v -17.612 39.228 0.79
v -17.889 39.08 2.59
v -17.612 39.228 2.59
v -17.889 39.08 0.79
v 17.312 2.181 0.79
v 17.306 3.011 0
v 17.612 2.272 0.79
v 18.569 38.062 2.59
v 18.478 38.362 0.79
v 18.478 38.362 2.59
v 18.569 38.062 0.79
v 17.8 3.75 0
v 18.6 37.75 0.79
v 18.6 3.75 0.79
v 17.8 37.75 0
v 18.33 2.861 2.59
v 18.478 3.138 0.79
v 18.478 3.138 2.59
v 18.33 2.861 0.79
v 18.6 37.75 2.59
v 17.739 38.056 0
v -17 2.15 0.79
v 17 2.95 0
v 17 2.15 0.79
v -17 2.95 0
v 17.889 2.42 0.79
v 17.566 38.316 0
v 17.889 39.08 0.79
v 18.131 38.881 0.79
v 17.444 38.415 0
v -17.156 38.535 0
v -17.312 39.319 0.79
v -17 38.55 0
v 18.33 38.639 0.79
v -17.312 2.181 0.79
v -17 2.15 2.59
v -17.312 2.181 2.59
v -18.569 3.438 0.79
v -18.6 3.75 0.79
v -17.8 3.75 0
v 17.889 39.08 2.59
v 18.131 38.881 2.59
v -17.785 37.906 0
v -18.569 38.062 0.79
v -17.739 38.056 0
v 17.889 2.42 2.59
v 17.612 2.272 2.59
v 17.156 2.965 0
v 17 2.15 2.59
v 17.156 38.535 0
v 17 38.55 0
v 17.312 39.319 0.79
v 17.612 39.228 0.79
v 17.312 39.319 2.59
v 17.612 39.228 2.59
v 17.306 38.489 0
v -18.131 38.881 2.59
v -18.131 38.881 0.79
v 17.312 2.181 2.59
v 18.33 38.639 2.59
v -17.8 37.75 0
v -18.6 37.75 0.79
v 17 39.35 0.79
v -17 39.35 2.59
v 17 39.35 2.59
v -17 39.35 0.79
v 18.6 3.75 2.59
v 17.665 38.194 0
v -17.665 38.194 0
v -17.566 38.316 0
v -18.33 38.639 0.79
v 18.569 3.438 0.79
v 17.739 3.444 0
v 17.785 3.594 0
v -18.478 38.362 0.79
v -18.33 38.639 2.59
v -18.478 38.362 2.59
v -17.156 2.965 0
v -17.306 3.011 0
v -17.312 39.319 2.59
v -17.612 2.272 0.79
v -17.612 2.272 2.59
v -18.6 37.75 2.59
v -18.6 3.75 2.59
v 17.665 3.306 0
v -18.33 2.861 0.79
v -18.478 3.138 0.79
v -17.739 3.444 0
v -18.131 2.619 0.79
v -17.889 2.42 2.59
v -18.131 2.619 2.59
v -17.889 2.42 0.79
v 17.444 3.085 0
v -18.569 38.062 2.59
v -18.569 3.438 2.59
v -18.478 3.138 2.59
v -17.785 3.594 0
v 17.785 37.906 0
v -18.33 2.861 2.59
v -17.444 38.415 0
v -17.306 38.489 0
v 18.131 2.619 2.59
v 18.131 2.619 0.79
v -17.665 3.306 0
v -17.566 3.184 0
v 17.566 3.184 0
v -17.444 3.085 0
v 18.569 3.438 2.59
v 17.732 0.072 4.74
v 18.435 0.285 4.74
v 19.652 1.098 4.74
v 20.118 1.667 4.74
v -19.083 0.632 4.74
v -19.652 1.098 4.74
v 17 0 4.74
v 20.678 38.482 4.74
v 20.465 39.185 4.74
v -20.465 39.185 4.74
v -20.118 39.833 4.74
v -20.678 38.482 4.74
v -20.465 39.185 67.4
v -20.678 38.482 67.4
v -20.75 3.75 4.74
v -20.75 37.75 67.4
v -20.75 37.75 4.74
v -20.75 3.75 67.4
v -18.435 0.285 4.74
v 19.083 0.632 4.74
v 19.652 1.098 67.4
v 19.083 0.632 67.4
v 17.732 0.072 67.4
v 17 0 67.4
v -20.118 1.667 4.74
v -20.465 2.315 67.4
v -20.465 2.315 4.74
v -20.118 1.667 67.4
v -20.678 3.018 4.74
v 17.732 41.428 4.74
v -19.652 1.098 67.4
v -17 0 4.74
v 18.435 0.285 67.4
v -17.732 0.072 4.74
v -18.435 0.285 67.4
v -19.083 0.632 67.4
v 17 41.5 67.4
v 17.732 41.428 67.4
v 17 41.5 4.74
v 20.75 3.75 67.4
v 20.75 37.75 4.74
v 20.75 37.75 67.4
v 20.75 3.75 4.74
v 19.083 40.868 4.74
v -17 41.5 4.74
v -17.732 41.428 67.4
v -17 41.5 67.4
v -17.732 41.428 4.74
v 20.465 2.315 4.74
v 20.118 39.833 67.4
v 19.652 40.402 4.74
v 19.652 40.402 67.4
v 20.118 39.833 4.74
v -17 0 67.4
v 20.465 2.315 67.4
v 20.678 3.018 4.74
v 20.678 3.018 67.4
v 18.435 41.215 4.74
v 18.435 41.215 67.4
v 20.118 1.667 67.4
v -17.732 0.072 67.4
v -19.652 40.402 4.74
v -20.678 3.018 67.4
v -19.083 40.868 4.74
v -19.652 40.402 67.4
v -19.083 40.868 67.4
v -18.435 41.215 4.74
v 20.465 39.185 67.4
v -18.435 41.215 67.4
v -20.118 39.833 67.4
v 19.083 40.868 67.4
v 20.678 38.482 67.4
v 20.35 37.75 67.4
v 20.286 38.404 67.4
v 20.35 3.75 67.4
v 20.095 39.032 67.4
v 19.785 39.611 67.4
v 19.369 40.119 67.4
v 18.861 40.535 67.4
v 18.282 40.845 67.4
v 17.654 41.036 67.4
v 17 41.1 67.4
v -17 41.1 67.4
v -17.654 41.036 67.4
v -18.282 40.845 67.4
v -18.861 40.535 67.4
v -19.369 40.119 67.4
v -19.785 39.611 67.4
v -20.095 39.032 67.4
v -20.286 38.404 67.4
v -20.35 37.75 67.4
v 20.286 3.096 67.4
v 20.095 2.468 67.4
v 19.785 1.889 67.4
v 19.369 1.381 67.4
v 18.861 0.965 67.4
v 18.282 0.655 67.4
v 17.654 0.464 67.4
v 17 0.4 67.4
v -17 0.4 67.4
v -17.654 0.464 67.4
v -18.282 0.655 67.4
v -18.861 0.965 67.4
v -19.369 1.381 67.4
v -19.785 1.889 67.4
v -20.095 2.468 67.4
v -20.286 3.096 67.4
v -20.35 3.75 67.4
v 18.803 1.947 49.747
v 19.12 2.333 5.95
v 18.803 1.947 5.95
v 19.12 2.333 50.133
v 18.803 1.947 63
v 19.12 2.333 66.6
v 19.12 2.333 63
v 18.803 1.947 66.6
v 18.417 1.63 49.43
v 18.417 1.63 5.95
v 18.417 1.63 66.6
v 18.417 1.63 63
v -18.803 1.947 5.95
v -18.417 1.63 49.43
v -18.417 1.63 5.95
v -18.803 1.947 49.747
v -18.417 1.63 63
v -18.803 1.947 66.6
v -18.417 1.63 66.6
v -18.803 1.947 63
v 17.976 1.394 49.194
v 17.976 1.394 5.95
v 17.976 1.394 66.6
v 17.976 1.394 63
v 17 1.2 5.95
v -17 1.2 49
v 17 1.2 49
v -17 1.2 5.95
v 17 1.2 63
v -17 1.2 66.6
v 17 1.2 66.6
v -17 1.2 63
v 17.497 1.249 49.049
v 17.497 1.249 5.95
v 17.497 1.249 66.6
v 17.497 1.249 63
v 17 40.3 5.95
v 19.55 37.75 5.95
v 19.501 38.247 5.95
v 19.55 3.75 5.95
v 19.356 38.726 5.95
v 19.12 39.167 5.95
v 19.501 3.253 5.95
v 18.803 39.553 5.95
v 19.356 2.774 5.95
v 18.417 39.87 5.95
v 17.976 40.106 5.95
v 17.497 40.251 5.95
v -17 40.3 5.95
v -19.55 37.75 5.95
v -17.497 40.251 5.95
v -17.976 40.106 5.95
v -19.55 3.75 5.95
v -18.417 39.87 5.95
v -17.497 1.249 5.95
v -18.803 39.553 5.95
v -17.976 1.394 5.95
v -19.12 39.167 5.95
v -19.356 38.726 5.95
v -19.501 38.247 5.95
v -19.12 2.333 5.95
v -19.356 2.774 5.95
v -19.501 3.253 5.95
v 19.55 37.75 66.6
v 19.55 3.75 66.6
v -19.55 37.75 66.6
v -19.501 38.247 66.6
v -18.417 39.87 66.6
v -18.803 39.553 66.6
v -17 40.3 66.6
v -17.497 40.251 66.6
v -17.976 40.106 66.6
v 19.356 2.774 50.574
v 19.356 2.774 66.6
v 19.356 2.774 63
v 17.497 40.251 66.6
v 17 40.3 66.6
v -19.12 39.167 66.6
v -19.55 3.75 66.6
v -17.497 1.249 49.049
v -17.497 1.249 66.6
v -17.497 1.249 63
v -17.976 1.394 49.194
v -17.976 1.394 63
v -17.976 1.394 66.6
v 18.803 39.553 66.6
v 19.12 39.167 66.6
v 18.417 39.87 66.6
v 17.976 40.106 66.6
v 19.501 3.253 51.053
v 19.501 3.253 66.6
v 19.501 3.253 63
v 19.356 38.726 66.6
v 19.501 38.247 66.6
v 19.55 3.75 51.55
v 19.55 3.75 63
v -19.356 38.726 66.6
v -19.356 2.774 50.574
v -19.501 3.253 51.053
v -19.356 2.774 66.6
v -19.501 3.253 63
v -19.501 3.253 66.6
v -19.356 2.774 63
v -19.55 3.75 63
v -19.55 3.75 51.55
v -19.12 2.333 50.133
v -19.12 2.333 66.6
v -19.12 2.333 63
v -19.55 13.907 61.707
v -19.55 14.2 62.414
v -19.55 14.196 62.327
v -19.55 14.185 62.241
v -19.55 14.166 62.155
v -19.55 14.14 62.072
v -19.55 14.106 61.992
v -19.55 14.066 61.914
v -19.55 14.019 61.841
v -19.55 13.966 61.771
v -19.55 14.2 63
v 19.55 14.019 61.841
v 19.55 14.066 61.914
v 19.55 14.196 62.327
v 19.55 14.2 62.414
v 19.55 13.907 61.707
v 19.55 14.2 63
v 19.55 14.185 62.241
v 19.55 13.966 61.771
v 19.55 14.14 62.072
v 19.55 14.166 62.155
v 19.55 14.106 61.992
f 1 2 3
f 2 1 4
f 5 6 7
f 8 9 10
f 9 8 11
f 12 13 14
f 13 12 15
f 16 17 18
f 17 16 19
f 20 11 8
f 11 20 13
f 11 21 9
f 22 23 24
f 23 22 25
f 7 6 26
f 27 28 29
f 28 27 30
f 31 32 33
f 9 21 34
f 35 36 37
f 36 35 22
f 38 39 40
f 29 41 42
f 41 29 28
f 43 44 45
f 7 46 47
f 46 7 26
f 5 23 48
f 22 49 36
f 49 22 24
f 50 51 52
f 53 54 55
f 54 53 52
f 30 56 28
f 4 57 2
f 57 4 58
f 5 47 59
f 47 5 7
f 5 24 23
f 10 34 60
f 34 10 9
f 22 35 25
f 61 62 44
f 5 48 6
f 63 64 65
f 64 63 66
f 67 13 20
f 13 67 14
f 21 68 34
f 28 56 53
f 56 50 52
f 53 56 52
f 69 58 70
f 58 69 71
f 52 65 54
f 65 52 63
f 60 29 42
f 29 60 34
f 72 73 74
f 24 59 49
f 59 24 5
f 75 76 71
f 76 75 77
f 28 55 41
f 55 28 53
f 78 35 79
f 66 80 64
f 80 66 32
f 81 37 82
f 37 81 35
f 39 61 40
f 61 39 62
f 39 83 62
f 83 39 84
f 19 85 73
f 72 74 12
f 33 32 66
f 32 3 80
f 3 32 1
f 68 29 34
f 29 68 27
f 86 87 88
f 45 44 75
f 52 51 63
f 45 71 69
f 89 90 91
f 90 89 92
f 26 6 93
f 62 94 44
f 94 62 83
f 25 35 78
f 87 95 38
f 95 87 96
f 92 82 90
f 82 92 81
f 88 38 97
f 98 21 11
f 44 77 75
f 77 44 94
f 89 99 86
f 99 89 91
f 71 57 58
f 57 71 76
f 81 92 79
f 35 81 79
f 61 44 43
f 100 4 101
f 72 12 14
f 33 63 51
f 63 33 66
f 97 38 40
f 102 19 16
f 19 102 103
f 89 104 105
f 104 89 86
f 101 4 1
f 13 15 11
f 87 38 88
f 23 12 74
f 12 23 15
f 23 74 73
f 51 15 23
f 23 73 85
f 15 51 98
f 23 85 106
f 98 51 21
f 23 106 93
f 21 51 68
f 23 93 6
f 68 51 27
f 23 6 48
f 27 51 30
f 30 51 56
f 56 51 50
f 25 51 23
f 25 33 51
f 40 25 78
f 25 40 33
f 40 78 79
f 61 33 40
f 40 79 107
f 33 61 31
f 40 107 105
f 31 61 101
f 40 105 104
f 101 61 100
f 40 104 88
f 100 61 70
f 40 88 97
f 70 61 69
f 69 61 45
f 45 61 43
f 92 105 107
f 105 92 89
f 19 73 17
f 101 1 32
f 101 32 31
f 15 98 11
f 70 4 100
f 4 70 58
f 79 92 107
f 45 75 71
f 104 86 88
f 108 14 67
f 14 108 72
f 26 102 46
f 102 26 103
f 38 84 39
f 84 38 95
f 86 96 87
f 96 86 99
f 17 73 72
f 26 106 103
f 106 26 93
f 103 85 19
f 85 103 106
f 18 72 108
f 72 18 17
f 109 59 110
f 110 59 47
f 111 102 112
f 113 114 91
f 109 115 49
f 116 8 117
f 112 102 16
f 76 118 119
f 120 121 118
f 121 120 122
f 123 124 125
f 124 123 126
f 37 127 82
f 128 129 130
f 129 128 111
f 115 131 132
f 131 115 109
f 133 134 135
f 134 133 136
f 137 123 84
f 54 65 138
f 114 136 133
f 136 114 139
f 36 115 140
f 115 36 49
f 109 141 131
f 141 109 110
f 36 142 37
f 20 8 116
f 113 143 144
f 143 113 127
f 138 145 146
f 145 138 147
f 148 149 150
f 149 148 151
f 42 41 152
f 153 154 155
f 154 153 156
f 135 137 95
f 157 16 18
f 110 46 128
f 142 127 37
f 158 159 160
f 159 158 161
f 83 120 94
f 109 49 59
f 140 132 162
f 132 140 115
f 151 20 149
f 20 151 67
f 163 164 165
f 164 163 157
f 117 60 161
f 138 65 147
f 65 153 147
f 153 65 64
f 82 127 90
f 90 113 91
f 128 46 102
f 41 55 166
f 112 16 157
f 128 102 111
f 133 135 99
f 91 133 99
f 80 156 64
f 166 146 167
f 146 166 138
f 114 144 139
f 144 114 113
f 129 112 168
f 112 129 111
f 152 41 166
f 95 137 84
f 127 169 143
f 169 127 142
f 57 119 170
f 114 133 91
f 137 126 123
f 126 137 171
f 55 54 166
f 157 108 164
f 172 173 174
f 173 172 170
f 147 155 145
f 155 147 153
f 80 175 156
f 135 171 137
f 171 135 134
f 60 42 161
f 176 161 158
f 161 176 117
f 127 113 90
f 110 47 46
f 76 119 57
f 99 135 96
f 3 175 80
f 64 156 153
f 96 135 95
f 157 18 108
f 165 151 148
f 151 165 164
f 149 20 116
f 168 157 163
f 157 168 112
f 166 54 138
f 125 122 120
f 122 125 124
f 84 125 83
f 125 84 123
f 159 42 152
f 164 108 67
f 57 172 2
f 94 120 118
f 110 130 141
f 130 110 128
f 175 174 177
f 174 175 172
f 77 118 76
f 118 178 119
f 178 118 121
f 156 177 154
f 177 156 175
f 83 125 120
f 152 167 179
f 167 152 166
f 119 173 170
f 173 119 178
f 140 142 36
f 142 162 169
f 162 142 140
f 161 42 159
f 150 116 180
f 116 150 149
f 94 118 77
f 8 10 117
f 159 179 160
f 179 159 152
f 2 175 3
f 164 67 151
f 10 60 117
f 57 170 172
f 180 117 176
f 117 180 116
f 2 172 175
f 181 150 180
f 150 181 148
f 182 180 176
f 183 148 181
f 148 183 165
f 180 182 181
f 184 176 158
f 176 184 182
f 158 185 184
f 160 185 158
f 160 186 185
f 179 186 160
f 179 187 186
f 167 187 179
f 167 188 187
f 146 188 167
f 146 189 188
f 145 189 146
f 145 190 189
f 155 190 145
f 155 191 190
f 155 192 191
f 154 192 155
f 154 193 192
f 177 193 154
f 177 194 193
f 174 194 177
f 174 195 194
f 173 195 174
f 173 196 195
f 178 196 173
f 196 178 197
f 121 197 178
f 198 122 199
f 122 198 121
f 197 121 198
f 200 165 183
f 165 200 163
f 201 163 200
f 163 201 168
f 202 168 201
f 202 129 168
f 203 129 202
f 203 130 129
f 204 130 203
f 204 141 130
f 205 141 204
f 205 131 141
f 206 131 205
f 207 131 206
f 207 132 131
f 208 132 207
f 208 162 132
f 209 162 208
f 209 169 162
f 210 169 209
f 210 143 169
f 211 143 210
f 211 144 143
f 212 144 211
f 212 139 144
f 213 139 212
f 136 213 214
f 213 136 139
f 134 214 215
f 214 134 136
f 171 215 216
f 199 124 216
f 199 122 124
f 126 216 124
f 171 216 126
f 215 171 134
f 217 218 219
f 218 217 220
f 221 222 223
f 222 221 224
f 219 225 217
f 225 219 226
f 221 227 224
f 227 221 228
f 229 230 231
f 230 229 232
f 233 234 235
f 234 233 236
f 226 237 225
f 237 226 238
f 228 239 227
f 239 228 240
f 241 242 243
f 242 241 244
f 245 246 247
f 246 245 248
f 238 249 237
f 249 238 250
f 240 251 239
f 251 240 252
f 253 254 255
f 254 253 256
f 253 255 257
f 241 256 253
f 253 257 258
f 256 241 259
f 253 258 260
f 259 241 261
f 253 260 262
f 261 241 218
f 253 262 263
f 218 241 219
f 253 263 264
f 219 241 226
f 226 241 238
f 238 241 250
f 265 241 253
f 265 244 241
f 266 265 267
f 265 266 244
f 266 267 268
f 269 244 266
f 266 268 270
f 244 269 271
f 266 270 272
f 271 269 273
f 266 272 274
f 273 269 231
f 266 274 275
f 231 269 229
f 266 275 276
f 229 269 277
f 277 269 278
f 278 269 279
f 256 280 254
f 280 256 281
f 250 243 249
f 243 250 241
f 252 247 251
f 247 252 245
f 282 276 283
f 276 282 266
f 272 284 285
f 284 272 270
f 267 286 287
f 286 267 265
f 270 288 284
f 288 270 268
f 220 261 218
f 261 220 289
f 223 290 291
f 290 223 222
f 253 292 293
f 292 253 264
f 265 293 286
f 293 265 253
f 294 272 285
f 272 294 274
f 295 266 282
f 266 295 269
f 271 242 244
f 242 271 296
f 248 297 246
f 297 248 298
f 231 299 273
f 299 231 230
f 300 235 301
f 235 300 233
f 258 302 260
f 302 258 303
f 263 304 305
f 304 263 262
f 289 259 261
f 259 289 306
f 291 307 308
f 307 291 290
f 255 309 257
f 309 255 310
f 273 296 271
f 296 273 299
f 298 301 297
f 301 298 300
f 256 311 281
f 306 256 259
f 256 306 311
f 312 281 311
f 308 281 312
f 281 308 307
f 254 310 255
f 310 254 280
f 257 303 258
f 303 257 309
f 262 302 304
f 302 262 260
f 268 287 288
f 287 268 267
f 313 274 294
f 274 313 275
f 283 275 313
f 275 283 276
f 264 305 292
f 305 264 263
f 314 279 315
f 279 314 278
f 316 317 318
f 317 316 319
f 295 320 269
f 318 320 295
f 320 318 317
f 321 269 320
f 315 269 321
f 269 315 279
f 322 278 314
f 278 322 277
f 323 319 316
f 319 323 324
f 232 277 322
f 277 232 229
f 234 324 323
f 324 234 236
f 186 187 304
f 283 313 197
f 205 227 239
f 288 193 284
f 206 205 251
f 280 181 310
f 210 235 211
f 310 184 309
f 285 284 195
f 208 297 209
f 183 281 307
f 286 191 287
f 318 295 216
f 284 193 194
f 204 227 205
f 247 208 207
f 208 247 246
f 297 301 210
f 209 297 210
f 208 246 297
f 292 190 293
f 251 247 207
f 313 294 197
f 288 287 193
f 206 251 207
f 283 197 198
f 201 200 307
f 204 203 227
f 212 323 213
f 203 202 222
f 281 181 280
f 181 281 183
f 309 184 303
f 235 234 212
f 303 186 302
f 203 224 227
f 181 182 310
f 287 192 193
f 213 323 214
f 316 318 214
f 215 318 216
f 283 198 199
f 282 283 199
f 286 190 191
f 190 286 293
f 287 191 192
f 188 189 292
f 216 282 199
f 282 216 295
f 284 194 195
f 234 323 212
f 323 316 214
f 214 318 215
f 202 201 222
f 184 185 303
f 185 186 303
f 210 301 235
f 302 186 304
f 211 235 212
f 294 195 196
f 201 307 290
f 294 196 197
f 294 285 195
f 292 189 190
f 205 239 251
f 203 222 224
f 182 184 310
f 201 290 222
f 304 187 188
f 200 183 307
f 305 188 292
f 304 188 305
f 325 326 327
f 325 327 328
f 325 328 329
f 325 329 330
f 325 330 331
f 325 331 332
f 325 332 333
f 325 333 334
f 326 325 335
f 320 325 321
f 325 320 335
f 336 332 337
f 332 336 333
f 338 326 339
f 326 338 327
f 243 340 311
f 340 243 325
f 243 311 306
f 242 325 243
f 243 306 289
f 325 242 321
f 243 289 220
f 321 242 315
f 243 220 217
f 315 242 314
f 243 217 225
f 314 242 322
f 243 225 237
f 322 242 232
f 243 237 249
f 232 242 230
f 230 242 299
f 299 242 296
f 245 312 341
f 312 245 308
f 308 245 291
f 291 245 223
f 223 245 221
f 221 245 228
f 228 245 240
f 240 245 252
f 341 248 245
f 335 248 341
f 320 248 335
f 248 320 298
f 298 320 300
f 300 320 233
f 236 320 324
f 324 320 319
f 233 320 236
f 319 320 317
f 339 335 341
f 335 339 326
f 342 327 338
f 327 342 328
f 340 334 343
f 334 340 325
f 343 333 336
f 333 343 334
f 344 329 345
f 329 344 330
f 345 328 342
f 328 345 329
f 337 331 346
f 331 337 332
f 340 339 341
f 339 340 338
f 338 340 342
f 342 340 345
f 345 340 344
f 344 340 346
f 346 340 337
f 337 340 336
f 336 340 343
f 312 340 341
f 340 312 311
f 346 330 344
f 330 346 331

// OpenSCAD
// file: ../../../modules/gridfinity.scad
// Gridfinity ベースプレートの共有 module。
// 寸法は Gridfinity 仕様 (Zack Freedman) の baseplate 輪郭に従う:
//   ピッチ 42、ソケット上端開口 41.5 (角 R4)、上から 45° 面取り 2.15 →
//   垂直 1.8 (37.2 角・R1.85) → 45° 面取り 0.7 → 底 35.8 角 (R1.15)。
//   ソケット深さ = 2.15 + 1.8 + 0.7 = 4.65。
//
// 座標系: X が列方向 (中央が 0)、Y が行方向 (板の前端が 0)、Z=0 が板の底面。
// 板の外形は grid とは独立に rim で与えるので、grid より大きい板 (縁付き) を
// 作れる。ソケットは rim=[left, right, front, back] の内側へ 42 ピッチで並ぶ。

gf_pitch = 42;
gf_socket_top = 41.5; // 上端開口
gf_socket_mid = 37.2; // 垂直部
gf_socket_bot = 35.8; // 底
gf_socket_r_top = 4;
gf_socket_r_mid = 1.85;
gf_socket_r_bot = 1.15;
gf_chamfer_top = 2.15;
gf_wall_h = 1.8;
gf_chamfer_bot = 0.7;
gf_socket_depth = gf_chamfer_top + gf_wall_h + gf_chamfer_bot; // 4.65
gf_fn = 32;
gf_eps = 0.01; // hull 用の薄板の厚さ
gf_over = 0.5; // 切削の抜き代

// 角丸正方形または矩形 (w は一辺、または [幅, 奥行き]、角 R)
module
gf_rounded_square(w, r)
{
    offset(r = r, $fn = gf_fn)
        square(is_list(w) ? w - [ 2 * r, 2 * r ] : w - 2 * r, center = true);
}

// 厚さ gf_eps の角丸正方形の薄板を z に置く (hull の骨)
module
gf_slab(w, r, z)
{
    translate([ 0, 0, z ]) linear_extrude(gf_eps) gf_rounded_square(w, r);
}

// ソケット1個の切削体。z=0 がソケットの底 (床の天面)、+Z へ 4.65 で天面に出る。
// clearance は嵌合の逃げで、輪郭を全周へ clearance だけ外へ出す (幅 +2c、角 R
// +c)。pitch_x は X 方向のセル幅。端数でも角 R と面取りの寸法を保つ。
module
gf_socket_cut(clearance = 0, pitch_x = gf_pitch)
{
    z1 = gf_chamfer_bot;
    z2 = z1 + gf_wall_h;
    z3 = gf_socket_depth;
    c = clearance;
    assert(pitch_x > gf_pitch - gf_socket_top + 2 * gf_socket_r_top,
           "Cell width is too small for the socket corner radius");
    delta = [ pitch_x - gf_pitch, 0 ];
    bot = [ gf_socket_bot + 2 * c, gf_socket_bot + 2 * c ] + delta;
    mid = [ gf_socket_mid + 2 * c, gf_socket_mid + 2 * c ] + delta;
    top = [ gf_socket_top + 2 * c, gf_socket_top + 2 * c ] + delta;
    hull()
    {
        gf_slab(bot, gf_socket_r_bot + c, 0);
        gf_slab(mid, gf_socket_r_mid + c, z1 - gf_eps);
    }
    hull()
    {
        gf_slab(mid, gf_socket_r_mid + c, z1 - gf_eps);
        gf_slab(mid, gf_socket_r_mid + c, z2 - gf_eps);
    }
    hull()
    {
        gf_slab(mid, gf_socket_r_mid + c, z2 - gf_eps);
        gf_slab(top, gf_socket_r_top + c, z3 - gf_eps);
    }
    // 天面より上へ抜く (天面と同一平面の退化した面を残さない)
    gf_slab(top, gf_socket_r_top + c, z3 - gf_eps);
    translate([ 0, 0, z3 - gf_eps ]) linear_extrude(gf_over + gf_eps)
        gf_rounded_square(top, gf_socket_r_top + c);
}

// ベースプレート。cols x rows のソケットを床 floor_t の上に彫る。
// rim = [left, right, front, back] はソケット列の外側に残す縁の幅。
// 板の幅 = cols*42 + left + right、奥行き = rows*42 + front + back。
// cols の端数は左端の細幅セルになる。rows は正の整数。
// clearance はソケットの嵌合の逃げ (gf_socket_cut を参照)。
module
gf_baseplate(cols, rows, rim = [ 0, 0, 0, 0 ], floor_t = 1, clearance = 0)
{
    grid_w = cols * gf_pitch;
    grid_d = rows * gf_pitch;
    plate_w = grid_w + rim[0] + rim[1];
    plate_d = grid_d + rim[2] + rim[3];
    x0 = -plate_w / 2 + rim[0]; // ソケット列の左端
    first_pitch = grid_w - (ceil(cols) - 1) * gf_pitch;
    difference()
    {
        translate([ -plate_w / 2, 0, 0 ])
            cube([ plate_w, plate_d, floor_t + gf_socket_depth ]);
        for (c = [0:ceil(cols) - 1], r = [0:rows - 1])
            translate([
                x0 + (c == 0 ? first_pitch / 2
                             : first_pitch + (c - 0.5) * gf_pitch),
                rim[2] + (r + 0.5) * gf_pitch,
                floor_t
            ]) gf_socket_cut(clearance, c == 0 ? first_pitch : gf_pitch);
    }
}
// file: ../../../modules/gridfinity_bins.scad
include <gridfinity_bin.scad>

// assets/gridfinity-bin/ の bin 群の共通値と、サイズ 3 引数の払い出し口。
// 単体では何も描かない。設計の経緯と確定値は
// ledger/designs/gridfinity-bin-4u.md が正本。
// 通常binは4U/9U、X={1,1.5,2,2.5,3} × Y={1,2,3,4,5,5.5}。
// 両軸に端数を持つ組み合わせはassetに置かない（各高さ28種）。
// Xが横、Yがラベルの壁から奥、unitsが高さ（7mm単位）。
wall = 1.2;    // 0.4 ノズル 3 本
floor_t = 1.2; // 底 (4.75) の上に載せる床。床の天面 z = 5.95
label_d = 13;  // 12mm 幅のラベルシールを貼る天板の張り出し
label_t = 1; // 天板の厚さ (user 指定)。下は 45° の無垢のくさび
label_r = 1; // 天板の先端と 45° 面の境目の R (user 指定)
// カードケース (goods/card_case_2x3x4u.scad) の値。カードは ISO/IEC 7810 ID-1 (85.6 × 54 ×
// 0.76、隅 R3) で、長辺を Y (rows 方向) に寝かせ、X 中央・手前の壁から 10 奥に置く。ポケットは
// カードより 1 大きい (片側 0.5)。右奥のマスは壁の内面まで抜き、床と底を外形に平行な 45° の窪みにする。
// ポケットの左右の埋めの天面 (幅 13.05) が 12mm のラベルを貼る帯。ポケットと穴の交点の
// 縦エッジは丸める (開口の上縁は丸めない: 壁を上端まで垂直に保ち、収まる枚数を減らさない)
card_w = 54;    // カードの短辺 (X)。user 指定「高さ 54」
card_d = 85.6;  // カードの長辺 (Y)。user 指定「幅 85.6」
card_clear = 1; // ポケットの余裕 (user 指定「+1mm」)
// ポケットの手前の辺の、手前の壁の内面からの距離 (user 指定「10mm」)
card_off = 10;
// ポケットの平面の隅 R (user 指定「角の丸み 3mm」。ID-1 の隅は 2.88..3.48)
card_r = 3;
// ポケットと穴が交わる所の、埋めの凸の縦エッジの R (指の当たる角)
card_edge_r = 2;
recess_skin = floor_t + 1.75; // 窪みの床 z (底の皮)。user 指定「壁厚と同じ 1.2 は過剰、1.75 返す」

function bin_contract(cols, rows, units) = str("CONTRACT units=",
                                               units,
                                               " pitch=",
                                               gf_pitch,
                                               " outer=",
                                               gfb_outer,
                                               " h=",
                                               units* gfb_unit,
                                               " lip=",
                                               gfb_lip_h,
                                               " base=",
                                               gfb_base_bot,
                                               "/",
                                               gfb_base_mid,
                                               "/",
                                               gfb_outer,
                                               " base_h=",
                                               gfb_base_h,
                                               " wall=",
                                               wall,
                                               " floor_top=",
                                               gfb_base_h + floor_t,
                                               " label=",
                                               label_d,
                                               "x",
                                               label_t,
                                               " wedge=45 fillet=",
                                               label_r,
                                               " bin=",
                                               cols,
                                               "x",
                                               rows,
                                               " size=",
                                               cols* gf_pitch - 0.5,
                                               "x",
                                               rows* gf_pitch - 0.5);

// (cols, rows, units) でラベル付き bin を払い出す。例: gridfinity_bin(2, 4, 4)
module
gridfinity_bin(cols, rows, units = 4)
{
    echo(bin_contract(cols, rows, units));
    gfb_bin(cols, rows, units, wall, floor_t, label_d, label_t, label_r);
}

function card_contract(cols, rows, units) = str("CONTRACT card units=",
                                                units,
                                                " bin=",
                                                cols,
                                                "x",
                                                rows,
                                                " size=",
                                                cols* gf_pitch - 0.5,
                                                "x",
                                                rows* gf_pitch - 0.5,
                                                " h=",
                                                units* gfb_unit,
                                                " lip=",
                                                gfb_lip_h,
                                                " floor_top=",
                                                gfb_base_h + floor_t,
                                                " card=",
                                                card_w,
                                                "x",
                                                card_d,
                                                " pocket=",
                                                card_w + card_clear,
                                                "x",
                                                card_d + card_clear,
                                                " at=",
                                                -(card_w + card_clear) / 2,
                                                ",",
                                                wall + card_off,
                                                " hole=",
                                                (cols - 1) / 2 * gf_pitch - gfb_outer / 2,
                                                ",",
                                                (rows - 0.5) * gf_pitch - 0.25 - gfb_outer / 2,
                                                " hole_r=",
                                                gfb_outer_r - wall,
                                                " recess=",
                                                gfb_outer - 2 * wall,
                                                "/",
                                                gfb_base_mid - 2 * wall,
                                                " recess_floor=",
                                                recess_skin,
                                                " r=",
                                                card_r,
                                                " edge_r=",
                                                card_edge_r);

// (cols, rows, units) でカードケースを払い出す。例: gridfinity_card_case(2, 3, 4)
module
gridfinity_card_case(cols, rows, units = 4)
{
    echo(card_contract(cols, rows, units));
    gfb_card_case(cols,
                  rows,
                  units,
                  wall,
                  floor_t,
                  [ card_w, card_d ],
                  card_clear,
                  card_off,
                  card_r,
                  recess_skin,
                  card_edge_r);
}
// main file
include <../../../modules/gridfinity_bins.scad>

gridfinity_bin(1, 1, 9);
